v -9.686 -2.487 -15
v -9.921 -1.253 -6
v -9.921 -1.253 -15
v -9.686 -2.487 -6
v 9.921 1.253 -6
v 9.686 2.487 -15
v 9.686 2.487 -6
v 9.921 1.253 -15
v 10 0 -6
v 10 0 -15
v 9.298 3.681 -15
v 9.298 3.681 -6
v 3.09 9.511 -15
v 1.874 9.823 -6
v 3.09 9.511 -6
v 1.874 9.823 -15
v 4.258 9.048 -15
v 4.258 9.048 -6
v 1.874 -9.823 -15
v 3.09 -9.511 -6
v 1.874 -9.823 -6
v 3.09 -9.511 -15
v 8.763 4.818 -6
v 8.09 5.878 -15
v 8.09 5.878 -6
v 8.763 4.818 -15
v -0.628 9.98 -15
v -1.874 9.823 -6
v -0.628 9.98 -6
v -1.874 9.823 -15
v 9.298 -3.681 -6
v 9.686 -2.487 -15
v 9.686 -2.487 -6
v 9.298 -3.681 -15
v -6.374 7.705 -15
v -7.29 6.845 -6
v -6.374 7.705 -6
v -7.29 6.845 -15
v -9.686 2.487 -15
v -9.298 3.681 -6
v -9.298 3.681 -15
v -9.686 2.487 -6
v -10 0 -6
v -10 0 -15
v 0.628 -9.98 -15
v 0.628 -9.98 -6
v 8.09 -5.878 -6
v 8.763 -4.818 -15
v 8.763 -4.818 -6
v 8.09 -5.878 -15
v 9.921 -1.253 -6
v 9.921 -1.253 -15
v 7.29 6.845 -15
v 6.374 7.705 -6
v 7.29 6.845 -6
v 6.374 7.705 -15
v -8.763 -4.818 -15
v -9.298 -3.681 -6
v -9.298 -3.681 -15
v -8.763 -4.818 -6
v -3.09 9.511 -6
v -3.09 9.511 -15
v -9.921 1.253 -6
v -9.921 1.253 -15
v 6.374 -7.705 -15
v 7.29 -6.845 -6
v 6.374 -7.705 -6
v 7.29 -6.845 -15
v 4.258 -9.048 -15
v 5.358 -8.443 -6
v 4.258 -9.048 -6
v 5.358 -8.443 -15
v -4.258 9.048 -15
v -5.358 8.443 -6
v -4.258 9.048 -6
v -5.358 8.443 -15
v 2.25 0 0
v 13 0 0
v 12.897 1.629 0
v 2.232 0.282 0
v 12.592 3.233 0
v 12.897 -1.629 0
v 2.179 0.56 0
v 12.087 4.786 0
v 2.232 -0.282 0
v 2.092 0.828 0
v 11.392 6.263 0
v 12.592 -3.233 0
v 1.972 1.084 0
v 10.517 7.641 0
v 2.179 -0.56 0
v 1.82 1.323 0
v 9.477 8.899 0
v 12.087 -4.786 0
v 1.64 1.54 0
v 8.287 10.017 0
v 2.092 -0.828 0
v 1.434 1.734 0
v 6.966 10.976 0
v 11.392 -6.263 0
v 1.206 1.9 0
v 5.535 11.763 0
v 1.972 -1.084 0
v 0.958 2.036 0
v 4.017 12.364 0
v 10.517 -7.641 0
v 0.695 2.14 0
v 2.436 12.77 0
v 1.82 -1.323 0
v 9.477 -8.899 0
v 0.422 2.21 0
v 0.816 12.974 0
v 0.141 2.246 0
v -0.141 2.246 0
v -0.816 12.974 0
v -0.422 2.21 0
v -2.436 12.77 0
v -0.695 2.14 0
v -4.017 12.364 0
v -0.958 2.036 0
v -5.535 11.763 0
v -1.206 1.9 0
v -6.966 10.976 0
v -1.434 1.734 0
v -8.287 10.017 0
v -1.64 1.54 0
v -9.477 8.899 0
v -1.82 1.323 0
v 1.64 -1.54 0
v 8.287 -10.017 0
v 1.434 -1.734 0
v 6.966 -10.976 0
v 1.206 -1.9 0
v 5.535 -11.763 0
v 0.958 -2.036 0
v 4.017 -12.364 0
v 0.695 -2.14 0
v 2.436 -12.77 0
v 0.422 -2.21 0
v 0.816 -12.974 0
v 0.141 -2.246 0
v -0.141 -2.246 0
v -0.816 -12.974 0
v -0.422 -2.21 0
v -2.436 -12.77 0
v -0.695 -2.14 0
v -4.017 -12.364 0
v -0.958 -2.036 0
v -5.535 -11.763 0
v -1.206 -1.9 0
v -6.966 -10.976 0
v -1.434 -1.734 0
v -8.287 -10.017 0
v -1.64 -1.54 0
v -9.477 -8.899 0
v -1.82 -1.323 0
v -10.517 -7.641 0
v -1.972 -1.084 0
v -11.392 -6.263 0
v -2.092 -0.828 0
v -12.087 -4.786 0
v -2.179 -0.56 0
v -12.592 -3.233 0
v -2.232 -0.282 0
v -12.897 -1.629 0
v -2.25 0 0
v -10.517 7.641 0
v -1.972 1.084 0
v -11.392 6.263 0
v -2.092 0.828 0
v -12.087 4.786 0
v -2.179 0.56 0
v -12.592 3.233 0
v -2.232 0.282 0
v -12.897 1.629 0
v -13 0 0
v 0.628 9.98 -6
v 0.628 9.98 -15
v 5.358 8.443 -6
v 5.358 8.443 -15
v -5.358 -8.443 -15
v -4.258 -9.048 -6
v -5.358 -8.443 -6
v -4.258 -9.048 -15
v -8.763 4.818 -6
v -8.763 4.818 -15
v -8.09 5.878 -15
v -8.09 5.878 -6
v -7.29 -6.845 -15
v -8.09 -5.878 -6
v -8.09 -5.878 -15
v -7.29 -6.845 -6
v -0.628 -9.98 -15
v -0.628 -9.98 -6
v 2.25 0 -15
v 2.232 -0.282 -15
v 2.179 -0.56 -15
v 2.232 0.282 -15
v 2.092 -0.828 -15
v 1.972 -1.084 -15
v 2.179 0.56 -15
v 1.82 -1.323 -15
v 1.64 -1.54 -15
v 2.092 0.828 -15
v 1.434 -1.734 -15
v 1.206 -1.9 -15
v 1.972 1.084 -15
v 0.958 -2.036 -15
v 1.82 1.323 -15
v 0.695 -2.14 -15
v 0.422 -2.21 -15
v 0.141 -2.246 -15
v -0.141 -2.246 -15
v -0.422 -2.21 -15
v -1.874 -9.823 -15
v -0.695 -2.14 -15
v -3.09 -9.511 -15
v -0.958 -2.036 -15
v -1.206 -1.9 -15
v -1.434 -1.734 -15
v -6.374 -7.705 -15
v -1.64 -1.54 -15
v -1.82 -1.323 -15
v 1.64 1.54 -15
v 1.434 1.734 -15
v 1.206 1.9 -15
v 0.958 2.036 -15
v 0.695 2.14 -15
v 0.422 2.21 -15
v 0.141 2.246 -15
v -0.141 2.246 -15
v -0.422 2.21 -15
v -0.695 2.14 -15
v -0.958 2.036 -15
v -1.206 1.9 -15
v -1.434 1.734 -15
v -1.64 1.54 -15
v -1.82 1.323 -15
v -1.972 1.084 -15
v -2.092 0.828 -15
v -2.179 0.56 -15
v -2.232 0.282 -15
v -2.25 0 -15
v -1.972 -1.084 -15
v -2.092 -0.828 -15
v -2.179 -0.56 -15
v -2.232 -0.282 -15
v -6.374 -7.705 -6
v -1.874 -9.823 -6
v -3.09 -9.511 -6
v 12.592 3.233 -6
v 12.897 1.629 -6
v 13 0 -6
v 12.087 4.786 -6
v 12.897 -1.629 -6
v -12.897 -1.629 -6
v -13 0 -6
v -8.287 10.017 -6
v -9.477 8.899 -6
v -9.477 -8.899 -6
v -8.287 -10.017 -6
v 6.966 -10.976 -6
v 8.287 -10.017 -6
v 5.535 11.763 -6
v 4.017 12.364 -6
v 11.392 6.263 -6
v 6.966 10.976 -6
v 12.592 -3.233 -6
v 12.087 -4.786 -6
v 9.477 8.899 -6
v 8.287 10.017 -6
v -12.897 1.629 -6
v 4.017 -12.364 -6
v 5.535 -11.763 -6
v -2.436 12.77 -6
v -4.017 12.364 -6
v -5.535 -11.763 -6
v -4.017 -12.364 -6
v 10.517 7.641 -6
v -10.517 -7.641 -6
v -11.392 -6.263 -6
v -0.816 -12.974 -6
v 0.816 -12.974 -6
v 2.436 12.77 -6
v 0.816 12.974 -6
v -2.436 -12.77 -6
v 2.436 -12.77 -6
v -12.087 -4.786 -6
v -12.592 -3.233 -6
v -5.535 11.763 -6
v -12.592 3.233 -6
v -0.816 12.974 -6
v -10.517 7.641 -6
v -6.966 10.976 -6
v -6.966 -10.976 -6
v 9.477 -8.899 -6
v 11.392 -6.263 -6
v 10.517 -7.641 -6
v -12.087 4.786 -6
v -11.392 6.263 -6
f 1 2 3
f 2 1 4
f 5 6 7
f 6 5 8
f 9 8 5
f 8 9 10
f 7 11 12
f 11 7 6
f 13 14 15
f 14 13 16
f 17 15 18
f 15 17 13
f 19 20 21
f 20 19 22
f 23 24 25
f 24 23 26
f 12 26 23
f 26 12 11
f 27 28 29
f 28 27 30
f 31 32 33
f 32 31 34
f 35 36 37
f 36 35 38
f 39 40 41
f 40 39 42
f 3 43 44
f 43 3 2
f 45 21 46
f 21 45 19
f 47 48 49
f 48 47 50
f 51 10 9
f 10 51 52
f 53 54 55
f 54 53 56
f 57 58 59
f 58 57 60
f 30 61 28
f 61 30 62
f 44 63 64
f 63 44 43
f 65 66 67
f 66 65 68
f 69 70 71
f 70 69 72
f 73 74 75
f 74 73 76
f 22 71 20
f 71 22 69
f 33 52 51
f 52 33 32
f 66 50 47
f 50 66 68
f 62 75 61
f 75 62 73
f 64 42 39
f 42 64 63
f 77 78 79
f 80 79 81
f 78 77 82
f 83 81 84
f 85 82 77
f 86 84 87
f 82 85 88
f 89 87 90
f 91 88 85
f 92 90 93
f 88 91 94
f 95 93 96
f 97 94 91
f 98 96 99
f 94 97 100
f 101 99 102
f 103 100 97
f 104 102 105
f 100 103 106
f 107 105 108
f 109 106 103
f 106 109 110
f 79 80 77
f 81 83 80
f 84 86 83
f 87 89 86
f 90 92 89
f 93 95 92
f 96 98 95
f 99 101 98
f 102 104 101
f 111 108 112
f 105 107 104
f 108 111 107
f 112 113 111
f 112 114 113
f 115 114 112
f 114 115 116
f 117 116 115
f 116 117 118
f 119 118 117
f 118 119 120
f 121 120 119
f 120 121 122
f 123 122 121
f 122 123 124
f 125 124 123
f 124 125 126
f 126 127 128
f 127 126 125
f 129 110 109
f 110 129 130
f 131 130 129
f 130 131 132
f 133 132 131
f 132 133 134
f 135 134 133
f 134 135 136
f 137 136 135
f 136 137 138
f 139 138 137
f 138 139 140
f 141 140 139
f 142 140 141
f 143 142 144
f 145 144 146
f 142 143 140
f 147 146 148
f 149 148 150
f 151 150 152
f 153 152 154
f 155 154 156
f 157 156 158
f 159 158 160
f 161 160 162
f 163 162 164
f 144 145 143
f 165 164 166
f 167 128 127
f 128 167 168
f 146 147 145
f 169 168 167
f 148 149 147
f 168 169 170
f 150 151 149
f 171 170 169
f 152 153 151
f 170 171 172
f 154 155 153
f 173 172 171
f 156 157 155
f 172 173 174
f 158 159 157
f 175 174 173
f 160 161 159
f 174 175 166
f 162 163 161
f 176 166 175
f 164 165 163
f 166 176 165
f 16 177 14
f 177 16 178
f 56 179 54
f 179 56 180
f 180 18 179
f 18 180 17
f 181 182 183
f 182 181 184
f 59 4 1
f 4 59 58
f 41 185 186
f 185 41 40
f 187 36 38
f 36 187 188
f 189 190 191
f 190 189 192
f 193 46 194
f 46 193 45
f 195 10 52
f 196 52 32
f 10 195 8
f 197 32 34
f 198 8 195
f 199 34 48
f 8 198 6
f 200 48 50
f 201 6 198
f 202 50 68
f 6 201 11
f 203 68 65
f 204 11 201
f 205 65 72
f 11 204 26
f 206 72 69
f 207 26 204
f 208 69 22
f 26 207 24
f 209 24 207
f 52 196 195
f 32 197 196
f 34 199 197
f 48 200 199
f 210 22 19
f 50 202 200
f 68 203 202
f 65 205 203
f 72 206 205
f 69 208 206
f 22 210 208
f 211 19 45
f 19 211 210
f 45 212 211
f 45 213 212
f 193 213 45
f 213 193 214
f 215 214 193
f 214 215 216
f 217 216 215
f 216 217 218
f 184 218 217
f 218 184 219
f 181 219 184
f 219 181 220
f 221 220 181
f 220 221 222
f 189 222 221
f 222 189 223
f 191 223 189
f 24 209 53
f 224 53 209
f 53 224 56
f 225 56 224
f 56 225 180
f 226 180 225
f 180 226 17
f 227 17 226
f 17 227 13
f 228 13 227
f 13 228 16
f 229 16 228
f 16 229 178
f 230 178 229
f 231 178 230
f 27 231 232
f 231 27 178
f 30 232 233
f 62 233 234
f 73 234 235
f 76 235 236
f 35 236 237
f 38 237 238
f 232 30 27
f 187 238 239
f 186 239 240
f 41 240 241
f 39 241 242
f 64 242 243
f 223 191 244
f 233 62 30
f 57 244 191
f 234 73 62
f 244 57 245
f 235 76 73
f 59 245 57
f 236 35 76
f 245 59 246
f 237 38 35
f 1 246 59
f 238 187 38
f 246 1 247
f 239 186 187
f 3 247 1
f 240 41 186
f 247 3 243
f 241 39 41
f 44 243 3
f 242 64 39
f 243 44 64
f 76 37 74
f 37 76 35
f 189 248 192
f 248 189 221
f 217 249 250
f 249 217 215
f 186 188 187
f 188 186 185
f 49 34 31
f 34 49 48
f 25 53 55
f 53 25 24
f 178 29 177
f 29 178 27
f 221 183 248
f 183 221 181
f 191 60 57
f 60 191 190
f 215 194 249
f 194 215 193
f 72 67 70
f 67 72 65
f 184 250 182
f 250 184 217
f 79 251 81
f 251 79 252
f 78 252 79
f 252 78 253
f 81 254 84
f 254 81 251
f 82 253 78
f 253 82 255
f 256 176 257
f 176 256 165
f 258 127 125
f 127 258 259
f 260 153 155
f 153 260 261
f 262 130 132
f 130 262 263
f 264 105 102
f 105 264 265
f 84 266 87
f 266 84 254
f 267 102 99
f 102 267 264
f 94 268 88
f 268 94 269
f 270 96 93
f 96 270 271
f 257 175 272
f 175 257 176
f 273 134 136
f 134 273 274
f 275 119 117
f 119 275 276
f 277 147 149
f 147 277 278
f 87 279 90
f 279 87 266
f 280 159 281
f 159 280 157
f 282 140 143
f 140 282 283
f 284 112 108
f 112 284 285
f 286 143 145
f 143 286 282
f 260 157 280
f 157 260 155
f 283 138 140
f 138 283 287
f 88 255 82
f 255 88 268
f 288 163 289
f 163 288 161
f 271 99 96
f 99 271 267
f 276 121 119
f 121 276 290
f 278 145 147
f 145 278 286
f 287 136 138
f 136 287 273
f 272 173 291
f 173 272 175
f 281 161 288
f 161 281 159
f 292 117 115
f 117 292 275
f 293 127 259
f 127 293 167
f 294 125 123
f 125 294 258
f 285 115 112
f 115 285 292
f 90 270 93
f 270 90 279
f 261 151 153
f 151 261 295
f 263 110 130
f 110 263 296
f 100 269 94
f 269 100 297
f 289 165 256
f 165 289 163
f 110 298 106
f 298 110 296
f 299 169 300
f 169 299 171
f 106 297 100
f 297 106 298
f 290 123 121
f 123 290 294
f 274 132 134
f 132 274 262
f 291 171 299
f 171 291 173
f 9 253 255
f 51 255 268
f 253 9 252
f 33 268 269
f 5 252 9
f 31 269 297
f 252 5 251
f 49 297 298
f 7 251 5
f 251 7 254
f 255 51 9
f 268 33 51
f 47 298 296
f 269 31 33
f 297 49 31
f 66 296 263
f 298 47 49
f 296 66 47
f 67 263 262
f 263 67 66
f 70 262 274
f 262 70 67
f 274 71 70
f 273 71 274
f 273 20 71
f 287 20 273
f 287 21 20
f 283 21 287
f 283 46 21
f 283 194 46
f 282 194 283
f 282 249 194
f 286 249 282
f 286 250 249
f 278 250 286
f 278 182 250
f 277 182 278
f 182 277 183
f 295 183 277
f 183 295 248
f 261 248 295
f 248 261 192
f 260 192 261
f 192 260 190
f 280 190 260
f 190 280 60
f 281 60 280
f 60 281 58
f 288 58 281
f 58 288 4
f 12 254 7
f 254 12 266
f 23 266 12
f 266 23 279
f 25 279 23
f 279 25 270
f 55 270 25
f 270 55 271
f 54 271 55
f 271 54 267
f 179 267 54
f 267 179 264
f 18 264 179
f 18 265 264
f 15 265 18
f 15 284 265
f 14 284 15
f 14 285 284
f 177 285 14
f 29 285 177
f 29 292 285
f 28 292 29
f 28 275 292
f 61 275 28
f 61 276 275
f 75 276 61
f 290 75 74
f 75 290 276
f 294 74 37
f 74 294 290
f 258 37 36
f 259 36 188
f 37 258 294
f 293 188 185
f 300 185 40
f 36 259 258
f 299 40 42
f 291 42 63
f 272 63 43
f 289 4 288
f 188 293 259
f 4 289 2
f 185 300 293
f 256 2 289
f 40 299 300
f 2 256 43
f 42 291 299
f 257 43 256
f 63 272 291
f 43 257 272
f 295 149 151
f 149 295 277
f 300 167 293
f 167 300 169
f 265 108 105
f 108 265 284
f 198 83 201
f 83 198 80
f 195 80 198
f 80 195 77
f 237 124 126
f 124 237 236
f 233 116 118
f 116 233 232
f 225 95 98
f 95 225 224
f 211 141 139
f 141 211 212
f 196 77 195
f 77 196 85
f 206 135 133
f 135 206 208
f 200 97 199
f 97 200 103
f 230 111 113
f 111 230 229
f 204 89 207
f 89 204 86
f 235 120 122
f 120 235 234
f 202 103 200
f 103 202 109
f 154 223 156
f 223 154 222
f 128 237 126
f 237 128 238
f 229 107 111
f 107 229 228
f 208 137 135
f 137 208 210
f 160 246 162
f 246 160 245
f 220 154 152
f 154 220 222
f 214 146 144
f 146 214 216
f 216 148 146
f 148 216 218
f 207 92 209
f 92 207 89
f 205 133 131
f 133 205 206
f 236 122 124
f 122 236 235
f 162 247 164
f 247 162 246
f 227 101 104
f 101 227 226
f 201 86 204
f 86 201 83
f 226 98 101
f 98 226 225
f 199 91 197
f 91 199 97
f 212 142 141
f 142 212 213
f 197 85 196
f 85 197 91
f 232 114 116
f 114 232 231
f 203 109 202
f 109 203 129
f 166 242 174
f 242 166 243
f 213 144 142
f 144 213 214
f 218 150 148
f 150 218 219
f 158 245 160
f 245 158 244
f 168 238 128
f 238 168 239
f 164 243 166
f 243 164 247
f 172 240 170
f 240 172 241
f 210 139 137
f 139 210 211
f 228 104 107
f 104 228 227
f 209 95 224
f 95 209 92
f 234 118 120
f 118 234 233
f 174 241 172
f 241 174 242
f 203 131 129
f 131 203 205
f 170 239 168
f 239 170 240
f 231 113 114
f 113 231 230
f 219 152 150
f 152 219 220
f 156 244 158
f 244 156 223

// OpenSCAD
$fn = 50;


difference() {
	union() {
		translate(v = [0, 0, -15.0000000000]) {
			cylinder(h = 15, r = 10.0000000000);
		}
		translate(v = [0, 0, -6.0000000000]) {
			cylinder(h = 6, r = 13.0000000000);
		}
	}
	union() {
		#translate(v = [0, 0, -15]) {
			cylinder(h = 15, r = 2.2500000000);
		}
	}
}
